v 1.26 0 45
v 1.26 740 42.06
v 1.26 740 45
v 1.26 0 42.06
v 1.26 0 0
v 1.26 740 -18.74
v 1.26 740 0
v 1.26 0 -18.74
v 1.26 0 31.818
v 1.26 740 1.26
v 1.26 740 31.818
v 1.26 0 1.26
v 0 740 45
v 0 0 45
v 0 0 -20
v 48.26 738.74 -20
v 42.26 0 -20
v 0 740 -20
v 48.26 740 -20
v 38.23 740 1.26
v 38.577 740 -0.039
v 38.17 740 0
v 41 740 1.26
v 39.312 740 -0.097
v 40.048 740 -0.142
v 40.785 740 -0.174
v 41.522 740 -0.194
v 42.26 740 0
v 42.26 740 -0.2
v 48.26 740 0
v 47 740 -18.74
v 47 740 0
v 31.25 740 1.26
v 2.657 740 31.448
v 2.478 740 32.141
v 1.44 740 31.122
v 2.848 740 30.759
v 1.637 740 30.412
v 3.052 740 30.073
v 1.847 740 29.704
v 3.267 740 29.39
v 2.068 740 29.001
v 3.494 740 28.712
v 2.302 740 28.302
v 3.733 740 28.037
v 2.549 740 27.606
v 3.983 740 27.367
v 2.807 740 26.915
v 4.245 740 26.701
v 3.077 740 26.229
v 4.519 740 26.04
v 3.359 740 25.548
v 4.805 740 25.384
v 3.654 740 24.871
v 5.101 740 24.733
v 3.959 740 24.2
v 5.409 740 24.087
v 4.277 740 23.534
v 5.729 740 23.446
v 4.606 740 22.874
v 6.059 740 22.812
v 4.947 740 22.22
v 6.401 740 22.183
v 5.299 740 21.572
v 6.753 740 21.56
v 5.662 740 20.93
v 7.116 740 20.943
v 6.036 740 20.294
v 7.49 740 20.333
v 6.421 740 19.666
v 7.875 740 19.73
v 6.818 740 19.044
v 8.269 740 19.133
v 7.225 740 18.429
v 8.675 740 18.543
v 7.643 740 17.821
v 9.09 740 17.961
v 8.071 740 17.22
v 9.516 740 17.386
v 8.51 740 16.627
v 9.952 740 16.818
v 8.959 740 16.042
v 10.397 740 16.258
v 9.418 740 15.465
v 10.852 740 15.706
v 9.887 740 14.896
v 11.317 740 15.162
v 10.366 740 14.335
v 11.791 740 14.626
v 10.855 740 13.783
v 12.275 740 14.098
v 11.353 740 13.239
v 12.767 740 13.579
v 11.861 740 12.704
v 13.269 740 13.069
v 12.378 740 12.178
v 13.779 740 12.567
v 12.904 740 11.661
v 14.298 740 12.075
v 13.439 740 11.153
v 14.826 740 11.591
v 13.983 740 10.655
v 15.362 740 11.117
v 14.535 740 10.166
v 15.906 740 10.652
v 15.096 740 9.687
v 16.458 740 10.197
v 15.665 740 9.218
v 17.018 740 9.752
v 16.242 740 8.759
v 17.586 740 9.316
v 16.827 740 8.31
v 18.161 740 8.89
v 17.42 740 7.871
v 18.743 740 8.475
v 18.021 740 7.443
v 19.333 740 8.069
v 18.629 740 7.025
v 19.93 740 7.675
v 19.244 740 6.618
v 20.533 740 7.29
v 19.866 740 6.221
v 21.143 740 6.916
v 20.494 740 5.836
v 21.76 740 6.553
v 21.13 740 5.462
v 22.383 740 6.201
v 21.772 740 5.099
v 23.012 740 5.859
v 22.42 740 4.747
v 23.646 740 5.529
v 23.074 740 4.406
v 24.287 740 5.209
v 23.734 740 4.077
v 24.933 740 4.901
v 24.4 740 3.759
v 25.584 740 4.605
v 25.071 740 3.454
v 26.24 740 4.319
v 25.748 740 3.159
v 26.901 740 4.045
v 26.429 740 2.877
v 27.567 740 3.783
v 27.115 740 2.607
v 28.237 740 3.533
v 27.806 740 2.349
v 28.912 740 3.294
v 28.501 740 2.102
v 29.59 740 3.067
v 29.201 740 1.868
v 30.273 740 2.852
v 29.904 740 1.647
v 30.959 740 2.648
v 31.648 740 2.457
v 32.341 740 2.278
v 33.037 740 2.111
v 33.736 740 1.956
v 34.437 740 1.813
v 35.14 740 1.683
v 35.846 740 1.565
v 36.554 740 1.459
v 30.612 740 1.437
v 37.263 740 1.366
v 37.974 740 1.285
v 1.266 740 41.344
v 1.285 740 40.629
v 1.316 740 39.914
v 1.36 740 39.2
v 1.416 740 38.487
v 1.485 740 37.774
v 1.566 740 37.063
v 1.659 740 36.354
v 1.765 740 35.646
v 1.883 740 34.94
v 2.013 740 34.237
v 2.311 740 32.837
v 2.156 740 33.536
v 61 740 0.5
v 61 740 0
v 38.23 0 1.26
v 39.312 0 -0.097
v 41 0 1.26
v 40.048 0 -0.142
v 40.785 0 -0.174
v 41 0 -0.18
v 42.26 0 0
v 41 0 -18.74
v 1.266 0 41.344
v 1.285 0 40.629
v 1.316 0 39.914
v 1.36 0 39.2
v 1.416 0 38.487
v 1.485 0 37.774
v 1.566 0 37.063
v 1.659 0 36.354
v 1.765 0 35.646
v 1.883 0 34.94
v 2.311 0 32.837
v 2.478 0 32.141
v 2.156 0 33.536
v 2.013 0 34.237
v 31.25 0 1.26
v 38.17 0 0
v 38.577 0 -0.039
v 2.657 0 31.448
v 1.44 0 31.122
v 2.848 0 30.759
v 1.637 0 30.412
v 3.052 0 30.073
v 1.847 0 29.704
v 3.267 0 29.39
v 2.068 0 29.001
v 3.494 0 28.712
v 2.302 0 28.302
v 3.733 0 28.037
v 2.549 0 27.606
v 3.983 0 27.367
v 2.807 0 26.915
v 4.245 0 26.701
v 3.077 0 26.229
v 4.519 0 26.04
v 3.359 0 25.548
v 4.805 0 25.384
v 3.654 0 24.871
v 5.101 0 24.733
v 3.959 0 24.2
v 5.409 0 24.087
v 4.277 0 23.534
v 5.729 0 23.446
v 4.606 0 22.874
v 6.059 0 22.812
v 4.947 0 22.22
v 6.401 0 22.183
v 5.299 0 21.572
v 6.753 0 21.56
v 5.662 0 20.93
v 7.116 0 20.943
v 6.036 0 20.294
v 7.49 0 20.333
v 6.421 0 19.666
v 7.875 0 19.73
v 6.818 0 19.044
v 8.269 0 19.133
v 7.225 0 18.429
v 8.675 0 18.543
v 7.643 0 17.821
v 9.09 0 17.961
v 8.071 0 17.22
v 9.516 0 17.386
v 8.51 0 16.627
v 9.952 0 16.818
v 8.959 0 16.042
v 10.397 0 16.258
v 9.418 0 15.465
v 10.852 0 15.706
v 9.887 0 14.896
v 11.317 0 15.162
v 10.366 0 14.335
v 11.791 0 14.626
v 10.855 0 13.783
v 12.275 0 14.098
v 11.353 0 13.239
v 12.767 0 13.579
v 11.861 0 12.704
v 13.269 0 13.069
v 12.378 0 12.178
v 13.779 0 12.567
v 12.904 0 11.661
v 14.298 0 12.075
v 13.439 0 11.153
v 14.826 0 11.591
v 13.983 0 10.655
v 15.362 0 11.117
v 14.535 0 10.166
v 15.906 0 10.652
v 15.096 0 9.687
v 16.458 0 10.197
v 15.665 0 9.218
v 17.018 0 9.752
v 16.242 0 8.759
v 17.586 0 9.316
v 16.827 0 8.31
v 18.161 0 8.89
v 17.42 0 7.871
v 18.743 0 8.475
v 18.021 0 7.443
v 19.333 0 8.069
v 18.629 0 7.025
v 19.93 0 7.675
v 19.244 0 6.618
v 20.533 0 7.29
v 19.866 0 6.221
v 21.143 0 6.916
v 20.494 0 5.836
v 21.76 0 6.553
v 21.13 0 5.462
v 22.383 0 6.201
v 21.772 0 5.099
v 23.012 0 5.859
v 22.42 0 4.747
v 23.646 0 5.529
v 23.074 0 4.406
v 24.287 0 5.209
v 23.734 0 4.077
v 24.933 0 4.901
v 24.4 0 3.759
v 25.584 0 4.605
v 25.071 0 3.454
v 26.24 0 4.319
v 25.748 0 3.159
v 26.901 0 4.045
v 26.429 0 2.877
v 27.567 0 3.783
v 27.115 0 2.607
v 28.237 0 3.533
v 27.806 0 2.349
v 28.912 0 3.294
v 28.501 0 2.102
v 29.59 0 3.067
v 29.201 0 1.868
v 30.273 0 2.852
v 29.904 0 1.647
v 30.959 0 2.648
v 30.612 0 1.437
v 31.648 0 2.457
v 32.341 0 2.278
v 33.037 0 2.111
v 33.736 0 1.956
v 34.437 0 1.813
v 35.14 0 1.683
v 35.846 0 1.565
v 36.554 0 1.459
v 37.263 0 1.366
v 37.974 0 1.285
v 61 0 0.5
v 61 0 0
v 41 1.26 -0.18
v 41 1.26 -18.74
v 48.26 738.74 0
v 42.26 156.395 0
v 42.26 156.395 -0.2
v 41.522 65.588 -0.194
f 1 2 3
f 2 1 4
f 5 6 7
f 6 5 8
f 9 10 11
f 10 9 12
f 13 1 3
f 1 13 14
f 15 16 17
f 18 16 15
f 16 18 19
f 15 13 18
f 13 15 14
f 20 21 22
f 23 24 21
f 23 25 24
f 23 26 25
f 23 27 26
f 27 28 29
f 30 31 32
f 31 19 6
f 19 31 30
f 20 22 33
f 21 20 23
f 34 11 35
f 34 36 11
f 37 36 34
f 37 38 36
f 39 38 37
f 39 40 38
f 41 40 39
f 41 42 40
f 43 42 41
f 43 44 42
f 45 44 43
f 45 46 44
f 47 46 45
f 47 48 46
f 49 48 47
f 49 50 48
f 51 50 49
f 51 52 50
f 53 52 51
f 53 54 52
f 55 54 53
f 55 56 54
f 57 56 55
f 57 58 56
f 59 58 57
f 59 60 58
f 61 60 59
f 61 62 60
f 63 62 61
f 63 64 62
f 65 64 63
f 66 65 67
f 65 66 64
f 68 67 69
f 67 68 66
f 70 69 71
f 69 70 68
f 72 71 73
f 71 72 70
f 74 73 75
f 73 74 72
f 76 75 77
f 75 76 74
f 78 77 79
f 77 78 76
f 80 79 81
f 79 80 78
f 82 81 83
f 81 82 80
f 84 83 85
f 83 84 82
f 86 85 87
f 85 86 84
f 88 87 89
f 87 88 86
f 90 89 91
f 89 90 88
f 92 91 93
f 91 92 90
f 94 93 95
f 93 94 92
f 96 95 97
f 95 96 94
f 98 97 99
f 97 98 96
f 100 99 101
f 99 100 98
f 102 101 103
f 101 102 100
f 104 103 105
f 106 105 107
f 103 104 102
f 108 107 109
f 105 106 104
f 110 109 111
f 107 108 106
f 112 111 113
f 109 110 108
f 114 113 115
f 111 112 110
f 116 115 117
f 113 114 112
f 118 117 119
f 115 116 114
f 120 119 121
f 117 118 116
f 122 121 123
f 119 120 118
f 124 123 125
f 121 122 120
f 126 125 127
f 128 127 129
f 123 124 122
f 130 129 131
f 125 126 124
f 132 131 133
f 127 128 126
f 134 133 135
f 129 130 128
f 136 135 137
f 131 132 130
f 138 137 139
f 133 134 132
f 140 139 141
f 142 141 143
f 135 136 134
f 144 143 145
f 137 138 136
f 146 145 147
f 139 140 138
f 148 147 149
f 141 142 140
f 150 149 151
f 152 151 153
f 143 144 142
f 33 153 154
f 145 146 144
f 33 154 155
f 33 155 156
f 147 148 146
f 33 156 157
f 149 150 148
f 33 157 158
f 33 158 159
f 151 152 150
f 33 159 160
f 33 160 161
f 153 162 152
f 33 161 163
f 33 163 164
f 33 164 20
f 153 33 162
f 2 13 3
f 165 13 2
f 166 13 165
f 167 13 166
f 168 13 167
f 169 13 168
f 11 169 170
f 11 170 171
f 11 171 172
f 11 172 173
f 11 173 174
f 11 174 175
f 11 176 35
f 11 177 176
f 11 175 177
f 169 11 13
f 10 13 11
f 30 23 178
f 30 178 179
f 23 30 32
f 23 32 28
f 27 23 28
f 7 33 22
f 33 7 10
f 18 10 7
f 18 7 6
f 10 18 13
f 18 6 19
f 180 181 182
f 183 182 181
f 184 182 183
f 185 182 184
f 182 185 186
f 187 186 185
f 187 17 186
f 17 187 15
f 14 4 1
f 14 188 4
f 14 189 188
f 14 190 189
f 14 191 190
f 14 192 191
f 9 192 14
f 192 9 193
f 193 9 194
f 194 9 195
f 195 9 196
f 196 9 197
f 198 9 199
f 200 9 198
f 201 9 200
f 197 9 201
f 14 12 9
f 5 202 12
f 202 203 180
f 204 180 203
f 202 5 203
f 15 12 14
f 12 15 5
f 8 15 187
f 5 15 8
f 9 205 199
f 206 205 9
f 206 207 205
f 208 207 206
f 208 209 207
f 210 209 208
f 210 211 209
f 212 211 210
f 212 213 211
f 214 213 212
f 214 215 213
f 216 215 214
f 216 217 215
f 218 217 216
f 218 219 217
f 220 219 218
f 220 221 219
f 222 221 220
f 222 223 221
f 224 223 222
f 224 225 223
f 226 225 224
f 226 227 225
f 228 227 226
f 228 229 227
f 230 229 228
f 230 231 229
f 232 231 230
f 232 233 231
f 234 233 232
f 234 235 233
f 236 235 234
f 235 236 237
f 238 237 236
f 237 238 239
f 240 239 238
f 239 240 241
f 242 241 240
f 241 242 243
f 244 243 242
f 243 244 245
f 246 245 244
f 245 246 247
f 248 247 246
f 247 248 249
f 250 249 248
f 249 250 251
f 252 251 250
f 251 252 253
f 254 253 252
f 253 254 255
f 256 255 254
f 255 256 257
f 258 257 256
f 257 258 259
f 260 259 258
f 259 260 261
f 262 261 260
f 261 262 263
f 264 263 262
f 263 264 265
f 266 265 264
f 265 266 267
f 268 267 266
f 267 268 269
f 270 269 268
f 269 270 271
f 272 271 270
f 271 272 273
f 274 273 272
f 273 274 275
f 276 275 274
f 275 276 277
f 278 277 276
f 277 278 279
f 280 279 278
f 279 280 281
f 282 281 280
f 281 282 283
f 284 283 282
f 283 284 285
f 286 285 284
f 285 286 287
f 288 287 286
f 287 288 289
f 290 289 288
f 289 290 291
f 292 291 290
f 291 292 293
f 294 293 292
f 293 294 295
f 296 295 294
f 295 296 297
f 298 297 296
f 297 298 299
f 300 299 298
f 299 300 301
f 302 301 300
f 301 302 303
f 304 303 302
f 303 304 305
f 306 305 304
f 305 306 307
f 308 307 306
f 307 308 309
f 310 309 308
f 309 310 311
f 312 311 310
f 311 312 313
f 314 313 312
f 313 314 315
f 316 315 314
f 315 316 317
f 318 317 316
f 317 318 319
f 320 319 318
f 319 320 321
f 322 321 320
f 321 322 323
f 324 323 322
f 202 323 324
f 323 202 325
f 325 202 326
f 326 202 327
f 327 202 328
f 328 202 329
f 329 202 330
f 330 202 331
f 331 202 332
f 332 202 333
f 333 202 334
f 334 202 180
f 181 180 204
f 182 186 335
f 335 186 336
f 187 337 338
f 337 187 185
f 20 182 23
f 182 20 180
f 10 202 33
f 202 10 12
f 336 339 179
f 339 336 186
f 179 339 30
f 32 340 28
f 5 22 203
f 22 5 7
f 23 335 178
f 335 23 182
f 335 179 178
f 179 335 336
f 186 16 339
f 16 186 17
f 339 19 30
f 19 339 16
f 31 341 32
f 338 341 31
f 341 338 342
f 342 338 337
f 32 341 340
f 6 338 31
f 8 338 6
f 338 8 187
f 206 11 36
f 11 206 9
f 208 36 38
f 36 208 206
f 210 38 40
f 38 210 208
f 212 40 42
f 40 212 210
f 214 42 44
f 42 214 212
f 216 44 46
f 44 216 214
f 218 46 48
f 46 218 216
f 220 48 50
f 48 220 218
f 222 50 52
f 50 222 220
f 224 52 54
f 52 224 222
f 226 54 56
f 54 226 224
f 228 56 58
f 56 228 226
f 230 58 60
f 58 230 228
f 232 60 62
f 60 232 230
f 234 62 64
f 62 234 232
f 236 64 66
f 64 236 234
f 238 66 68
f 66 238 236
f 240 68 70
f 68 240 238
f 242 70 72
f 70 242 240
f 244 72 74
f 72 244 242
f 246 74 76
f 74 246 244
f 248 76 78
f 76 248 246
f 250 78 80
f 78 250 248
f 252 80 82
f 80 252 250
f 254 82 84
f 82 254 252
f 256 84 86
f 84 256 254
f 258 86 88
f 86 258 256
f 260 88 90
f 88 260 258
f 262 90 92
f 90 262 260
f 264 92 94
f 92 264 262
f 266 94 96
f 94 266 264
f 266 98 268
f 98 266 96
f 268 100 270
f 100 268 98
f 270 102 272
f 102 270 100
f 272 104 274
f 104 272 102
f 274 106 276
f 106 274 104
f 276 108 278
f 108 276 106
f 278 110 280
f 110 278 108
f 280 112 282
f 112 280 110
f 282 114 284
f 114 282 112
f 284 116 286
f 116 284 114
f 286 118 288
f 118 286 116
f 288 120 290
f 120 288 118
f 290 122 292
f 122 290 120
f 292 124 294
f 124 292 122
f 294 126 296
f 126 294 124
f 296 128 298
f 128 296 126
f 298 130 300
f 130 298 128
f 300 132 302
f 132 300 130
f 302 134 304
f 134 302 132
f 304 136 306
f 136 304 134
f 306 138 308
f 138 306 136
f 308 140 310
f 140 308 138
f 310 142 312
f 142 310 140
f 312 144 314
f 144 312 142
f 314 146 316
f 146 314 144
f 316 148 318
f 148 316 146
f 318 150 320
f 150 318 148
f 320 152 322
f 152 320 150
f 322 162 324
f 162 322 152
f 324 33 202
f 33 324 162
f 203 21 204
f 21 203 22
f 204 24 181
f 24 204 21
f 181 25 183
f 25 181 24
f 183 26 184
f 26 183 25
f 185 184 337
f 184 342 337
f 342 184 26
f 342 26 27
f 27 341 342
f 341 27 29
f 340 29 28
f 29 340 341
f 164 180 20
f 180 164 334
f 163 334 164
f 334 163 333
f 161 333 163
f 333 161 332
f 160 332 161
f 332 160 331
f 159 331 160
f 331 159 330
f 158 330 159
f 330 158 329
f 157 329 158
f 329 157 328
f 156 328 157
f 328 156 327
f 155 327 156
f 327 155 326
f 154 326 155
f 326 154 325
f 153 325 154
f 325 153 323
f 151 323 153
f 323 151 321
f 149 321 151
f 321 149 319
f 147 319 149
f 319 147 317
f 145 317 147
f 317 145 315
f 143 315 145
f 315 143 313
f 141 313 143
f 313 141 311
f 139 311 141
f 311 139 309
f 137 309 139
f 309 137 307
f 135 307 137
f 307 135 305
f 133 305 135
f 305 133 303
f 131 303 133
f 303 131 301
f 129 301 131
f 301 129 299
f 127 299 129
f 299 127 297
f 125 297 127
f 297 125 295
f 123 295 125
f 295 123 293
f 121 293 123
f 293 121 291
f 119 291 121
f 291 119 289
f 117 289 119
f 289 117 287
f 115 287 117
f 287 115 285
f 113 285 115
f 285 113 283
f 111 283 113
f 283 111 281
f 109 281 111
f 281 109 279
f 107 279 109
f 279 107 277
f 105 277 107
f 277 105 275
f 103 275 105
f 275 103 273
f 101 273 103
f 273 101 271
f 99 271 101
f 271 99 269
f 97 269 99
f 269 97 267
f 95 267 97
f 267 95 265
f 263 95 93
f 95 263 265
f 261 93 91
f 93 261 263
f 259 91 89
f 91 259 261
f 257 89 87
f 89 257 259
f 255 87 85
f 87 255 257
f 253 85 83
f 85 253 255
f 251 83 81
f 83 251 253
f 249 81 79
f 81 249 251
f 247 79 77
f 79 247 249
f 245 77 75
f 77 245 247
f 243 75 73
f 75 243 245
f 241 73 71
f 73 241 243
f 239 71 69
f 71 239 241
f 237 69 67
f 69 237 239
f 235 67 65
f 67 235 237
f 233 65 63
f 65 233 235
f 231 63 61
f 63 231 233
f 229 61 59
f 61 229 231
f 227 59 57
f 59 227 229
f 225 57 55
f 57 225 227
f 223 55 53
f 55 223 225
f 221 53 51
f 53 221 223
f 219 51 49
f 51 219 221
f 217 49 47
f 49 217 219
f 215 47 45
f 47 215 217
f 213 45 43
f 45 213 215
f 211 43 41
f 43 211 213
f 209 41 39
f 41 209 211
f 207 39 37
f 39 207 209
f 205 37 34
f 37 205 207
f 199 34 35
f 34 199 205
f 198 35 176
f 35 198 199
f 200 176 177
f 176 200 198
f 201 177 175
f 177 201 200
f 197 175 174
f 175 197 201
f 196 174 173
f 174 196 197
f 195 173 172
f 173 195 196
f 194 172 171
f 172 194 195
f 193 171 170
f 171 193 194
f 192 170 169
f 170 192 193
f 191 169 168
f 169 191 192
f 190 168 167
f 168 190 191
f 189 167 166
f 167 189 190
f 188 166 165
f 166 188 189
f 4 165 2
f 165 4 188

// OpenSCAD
///
// params

$fn=360;
length=740;
width=41;
width1=47;
height=45;
wall=1.26;

Corner();

module Corner() {
    translate([0,0,-20]) cube([wall, length, height + 20]);
    cube([width, length, wall]);
    translate([width, length, 0]) 
        rotate ([90, 0, 0]) 
            linear_extrude(length) 
                polygon([[0,0], [20, 0], [20, 0.5], [0, wall]]);
    hull() {
        translate([width,0,-20]) cube([wall, wall, 20]);
        translate([width1, length - wall,-20]) cube([wall, wall, 20]);
    }
    hull() {
        translate([0, 0, -20]) cube([width, wall, wall]);
        translate([0, length - wall, -20]) cube([width1, wall, wall]);
    }
    translate([width + wall , length, width + wall-0.2]) rotate([90,180,0]) linear_extrude(length) projection() rotate_extrude(angle=90) translate([width, 0, 0]) square([wall,0.01]);
}
